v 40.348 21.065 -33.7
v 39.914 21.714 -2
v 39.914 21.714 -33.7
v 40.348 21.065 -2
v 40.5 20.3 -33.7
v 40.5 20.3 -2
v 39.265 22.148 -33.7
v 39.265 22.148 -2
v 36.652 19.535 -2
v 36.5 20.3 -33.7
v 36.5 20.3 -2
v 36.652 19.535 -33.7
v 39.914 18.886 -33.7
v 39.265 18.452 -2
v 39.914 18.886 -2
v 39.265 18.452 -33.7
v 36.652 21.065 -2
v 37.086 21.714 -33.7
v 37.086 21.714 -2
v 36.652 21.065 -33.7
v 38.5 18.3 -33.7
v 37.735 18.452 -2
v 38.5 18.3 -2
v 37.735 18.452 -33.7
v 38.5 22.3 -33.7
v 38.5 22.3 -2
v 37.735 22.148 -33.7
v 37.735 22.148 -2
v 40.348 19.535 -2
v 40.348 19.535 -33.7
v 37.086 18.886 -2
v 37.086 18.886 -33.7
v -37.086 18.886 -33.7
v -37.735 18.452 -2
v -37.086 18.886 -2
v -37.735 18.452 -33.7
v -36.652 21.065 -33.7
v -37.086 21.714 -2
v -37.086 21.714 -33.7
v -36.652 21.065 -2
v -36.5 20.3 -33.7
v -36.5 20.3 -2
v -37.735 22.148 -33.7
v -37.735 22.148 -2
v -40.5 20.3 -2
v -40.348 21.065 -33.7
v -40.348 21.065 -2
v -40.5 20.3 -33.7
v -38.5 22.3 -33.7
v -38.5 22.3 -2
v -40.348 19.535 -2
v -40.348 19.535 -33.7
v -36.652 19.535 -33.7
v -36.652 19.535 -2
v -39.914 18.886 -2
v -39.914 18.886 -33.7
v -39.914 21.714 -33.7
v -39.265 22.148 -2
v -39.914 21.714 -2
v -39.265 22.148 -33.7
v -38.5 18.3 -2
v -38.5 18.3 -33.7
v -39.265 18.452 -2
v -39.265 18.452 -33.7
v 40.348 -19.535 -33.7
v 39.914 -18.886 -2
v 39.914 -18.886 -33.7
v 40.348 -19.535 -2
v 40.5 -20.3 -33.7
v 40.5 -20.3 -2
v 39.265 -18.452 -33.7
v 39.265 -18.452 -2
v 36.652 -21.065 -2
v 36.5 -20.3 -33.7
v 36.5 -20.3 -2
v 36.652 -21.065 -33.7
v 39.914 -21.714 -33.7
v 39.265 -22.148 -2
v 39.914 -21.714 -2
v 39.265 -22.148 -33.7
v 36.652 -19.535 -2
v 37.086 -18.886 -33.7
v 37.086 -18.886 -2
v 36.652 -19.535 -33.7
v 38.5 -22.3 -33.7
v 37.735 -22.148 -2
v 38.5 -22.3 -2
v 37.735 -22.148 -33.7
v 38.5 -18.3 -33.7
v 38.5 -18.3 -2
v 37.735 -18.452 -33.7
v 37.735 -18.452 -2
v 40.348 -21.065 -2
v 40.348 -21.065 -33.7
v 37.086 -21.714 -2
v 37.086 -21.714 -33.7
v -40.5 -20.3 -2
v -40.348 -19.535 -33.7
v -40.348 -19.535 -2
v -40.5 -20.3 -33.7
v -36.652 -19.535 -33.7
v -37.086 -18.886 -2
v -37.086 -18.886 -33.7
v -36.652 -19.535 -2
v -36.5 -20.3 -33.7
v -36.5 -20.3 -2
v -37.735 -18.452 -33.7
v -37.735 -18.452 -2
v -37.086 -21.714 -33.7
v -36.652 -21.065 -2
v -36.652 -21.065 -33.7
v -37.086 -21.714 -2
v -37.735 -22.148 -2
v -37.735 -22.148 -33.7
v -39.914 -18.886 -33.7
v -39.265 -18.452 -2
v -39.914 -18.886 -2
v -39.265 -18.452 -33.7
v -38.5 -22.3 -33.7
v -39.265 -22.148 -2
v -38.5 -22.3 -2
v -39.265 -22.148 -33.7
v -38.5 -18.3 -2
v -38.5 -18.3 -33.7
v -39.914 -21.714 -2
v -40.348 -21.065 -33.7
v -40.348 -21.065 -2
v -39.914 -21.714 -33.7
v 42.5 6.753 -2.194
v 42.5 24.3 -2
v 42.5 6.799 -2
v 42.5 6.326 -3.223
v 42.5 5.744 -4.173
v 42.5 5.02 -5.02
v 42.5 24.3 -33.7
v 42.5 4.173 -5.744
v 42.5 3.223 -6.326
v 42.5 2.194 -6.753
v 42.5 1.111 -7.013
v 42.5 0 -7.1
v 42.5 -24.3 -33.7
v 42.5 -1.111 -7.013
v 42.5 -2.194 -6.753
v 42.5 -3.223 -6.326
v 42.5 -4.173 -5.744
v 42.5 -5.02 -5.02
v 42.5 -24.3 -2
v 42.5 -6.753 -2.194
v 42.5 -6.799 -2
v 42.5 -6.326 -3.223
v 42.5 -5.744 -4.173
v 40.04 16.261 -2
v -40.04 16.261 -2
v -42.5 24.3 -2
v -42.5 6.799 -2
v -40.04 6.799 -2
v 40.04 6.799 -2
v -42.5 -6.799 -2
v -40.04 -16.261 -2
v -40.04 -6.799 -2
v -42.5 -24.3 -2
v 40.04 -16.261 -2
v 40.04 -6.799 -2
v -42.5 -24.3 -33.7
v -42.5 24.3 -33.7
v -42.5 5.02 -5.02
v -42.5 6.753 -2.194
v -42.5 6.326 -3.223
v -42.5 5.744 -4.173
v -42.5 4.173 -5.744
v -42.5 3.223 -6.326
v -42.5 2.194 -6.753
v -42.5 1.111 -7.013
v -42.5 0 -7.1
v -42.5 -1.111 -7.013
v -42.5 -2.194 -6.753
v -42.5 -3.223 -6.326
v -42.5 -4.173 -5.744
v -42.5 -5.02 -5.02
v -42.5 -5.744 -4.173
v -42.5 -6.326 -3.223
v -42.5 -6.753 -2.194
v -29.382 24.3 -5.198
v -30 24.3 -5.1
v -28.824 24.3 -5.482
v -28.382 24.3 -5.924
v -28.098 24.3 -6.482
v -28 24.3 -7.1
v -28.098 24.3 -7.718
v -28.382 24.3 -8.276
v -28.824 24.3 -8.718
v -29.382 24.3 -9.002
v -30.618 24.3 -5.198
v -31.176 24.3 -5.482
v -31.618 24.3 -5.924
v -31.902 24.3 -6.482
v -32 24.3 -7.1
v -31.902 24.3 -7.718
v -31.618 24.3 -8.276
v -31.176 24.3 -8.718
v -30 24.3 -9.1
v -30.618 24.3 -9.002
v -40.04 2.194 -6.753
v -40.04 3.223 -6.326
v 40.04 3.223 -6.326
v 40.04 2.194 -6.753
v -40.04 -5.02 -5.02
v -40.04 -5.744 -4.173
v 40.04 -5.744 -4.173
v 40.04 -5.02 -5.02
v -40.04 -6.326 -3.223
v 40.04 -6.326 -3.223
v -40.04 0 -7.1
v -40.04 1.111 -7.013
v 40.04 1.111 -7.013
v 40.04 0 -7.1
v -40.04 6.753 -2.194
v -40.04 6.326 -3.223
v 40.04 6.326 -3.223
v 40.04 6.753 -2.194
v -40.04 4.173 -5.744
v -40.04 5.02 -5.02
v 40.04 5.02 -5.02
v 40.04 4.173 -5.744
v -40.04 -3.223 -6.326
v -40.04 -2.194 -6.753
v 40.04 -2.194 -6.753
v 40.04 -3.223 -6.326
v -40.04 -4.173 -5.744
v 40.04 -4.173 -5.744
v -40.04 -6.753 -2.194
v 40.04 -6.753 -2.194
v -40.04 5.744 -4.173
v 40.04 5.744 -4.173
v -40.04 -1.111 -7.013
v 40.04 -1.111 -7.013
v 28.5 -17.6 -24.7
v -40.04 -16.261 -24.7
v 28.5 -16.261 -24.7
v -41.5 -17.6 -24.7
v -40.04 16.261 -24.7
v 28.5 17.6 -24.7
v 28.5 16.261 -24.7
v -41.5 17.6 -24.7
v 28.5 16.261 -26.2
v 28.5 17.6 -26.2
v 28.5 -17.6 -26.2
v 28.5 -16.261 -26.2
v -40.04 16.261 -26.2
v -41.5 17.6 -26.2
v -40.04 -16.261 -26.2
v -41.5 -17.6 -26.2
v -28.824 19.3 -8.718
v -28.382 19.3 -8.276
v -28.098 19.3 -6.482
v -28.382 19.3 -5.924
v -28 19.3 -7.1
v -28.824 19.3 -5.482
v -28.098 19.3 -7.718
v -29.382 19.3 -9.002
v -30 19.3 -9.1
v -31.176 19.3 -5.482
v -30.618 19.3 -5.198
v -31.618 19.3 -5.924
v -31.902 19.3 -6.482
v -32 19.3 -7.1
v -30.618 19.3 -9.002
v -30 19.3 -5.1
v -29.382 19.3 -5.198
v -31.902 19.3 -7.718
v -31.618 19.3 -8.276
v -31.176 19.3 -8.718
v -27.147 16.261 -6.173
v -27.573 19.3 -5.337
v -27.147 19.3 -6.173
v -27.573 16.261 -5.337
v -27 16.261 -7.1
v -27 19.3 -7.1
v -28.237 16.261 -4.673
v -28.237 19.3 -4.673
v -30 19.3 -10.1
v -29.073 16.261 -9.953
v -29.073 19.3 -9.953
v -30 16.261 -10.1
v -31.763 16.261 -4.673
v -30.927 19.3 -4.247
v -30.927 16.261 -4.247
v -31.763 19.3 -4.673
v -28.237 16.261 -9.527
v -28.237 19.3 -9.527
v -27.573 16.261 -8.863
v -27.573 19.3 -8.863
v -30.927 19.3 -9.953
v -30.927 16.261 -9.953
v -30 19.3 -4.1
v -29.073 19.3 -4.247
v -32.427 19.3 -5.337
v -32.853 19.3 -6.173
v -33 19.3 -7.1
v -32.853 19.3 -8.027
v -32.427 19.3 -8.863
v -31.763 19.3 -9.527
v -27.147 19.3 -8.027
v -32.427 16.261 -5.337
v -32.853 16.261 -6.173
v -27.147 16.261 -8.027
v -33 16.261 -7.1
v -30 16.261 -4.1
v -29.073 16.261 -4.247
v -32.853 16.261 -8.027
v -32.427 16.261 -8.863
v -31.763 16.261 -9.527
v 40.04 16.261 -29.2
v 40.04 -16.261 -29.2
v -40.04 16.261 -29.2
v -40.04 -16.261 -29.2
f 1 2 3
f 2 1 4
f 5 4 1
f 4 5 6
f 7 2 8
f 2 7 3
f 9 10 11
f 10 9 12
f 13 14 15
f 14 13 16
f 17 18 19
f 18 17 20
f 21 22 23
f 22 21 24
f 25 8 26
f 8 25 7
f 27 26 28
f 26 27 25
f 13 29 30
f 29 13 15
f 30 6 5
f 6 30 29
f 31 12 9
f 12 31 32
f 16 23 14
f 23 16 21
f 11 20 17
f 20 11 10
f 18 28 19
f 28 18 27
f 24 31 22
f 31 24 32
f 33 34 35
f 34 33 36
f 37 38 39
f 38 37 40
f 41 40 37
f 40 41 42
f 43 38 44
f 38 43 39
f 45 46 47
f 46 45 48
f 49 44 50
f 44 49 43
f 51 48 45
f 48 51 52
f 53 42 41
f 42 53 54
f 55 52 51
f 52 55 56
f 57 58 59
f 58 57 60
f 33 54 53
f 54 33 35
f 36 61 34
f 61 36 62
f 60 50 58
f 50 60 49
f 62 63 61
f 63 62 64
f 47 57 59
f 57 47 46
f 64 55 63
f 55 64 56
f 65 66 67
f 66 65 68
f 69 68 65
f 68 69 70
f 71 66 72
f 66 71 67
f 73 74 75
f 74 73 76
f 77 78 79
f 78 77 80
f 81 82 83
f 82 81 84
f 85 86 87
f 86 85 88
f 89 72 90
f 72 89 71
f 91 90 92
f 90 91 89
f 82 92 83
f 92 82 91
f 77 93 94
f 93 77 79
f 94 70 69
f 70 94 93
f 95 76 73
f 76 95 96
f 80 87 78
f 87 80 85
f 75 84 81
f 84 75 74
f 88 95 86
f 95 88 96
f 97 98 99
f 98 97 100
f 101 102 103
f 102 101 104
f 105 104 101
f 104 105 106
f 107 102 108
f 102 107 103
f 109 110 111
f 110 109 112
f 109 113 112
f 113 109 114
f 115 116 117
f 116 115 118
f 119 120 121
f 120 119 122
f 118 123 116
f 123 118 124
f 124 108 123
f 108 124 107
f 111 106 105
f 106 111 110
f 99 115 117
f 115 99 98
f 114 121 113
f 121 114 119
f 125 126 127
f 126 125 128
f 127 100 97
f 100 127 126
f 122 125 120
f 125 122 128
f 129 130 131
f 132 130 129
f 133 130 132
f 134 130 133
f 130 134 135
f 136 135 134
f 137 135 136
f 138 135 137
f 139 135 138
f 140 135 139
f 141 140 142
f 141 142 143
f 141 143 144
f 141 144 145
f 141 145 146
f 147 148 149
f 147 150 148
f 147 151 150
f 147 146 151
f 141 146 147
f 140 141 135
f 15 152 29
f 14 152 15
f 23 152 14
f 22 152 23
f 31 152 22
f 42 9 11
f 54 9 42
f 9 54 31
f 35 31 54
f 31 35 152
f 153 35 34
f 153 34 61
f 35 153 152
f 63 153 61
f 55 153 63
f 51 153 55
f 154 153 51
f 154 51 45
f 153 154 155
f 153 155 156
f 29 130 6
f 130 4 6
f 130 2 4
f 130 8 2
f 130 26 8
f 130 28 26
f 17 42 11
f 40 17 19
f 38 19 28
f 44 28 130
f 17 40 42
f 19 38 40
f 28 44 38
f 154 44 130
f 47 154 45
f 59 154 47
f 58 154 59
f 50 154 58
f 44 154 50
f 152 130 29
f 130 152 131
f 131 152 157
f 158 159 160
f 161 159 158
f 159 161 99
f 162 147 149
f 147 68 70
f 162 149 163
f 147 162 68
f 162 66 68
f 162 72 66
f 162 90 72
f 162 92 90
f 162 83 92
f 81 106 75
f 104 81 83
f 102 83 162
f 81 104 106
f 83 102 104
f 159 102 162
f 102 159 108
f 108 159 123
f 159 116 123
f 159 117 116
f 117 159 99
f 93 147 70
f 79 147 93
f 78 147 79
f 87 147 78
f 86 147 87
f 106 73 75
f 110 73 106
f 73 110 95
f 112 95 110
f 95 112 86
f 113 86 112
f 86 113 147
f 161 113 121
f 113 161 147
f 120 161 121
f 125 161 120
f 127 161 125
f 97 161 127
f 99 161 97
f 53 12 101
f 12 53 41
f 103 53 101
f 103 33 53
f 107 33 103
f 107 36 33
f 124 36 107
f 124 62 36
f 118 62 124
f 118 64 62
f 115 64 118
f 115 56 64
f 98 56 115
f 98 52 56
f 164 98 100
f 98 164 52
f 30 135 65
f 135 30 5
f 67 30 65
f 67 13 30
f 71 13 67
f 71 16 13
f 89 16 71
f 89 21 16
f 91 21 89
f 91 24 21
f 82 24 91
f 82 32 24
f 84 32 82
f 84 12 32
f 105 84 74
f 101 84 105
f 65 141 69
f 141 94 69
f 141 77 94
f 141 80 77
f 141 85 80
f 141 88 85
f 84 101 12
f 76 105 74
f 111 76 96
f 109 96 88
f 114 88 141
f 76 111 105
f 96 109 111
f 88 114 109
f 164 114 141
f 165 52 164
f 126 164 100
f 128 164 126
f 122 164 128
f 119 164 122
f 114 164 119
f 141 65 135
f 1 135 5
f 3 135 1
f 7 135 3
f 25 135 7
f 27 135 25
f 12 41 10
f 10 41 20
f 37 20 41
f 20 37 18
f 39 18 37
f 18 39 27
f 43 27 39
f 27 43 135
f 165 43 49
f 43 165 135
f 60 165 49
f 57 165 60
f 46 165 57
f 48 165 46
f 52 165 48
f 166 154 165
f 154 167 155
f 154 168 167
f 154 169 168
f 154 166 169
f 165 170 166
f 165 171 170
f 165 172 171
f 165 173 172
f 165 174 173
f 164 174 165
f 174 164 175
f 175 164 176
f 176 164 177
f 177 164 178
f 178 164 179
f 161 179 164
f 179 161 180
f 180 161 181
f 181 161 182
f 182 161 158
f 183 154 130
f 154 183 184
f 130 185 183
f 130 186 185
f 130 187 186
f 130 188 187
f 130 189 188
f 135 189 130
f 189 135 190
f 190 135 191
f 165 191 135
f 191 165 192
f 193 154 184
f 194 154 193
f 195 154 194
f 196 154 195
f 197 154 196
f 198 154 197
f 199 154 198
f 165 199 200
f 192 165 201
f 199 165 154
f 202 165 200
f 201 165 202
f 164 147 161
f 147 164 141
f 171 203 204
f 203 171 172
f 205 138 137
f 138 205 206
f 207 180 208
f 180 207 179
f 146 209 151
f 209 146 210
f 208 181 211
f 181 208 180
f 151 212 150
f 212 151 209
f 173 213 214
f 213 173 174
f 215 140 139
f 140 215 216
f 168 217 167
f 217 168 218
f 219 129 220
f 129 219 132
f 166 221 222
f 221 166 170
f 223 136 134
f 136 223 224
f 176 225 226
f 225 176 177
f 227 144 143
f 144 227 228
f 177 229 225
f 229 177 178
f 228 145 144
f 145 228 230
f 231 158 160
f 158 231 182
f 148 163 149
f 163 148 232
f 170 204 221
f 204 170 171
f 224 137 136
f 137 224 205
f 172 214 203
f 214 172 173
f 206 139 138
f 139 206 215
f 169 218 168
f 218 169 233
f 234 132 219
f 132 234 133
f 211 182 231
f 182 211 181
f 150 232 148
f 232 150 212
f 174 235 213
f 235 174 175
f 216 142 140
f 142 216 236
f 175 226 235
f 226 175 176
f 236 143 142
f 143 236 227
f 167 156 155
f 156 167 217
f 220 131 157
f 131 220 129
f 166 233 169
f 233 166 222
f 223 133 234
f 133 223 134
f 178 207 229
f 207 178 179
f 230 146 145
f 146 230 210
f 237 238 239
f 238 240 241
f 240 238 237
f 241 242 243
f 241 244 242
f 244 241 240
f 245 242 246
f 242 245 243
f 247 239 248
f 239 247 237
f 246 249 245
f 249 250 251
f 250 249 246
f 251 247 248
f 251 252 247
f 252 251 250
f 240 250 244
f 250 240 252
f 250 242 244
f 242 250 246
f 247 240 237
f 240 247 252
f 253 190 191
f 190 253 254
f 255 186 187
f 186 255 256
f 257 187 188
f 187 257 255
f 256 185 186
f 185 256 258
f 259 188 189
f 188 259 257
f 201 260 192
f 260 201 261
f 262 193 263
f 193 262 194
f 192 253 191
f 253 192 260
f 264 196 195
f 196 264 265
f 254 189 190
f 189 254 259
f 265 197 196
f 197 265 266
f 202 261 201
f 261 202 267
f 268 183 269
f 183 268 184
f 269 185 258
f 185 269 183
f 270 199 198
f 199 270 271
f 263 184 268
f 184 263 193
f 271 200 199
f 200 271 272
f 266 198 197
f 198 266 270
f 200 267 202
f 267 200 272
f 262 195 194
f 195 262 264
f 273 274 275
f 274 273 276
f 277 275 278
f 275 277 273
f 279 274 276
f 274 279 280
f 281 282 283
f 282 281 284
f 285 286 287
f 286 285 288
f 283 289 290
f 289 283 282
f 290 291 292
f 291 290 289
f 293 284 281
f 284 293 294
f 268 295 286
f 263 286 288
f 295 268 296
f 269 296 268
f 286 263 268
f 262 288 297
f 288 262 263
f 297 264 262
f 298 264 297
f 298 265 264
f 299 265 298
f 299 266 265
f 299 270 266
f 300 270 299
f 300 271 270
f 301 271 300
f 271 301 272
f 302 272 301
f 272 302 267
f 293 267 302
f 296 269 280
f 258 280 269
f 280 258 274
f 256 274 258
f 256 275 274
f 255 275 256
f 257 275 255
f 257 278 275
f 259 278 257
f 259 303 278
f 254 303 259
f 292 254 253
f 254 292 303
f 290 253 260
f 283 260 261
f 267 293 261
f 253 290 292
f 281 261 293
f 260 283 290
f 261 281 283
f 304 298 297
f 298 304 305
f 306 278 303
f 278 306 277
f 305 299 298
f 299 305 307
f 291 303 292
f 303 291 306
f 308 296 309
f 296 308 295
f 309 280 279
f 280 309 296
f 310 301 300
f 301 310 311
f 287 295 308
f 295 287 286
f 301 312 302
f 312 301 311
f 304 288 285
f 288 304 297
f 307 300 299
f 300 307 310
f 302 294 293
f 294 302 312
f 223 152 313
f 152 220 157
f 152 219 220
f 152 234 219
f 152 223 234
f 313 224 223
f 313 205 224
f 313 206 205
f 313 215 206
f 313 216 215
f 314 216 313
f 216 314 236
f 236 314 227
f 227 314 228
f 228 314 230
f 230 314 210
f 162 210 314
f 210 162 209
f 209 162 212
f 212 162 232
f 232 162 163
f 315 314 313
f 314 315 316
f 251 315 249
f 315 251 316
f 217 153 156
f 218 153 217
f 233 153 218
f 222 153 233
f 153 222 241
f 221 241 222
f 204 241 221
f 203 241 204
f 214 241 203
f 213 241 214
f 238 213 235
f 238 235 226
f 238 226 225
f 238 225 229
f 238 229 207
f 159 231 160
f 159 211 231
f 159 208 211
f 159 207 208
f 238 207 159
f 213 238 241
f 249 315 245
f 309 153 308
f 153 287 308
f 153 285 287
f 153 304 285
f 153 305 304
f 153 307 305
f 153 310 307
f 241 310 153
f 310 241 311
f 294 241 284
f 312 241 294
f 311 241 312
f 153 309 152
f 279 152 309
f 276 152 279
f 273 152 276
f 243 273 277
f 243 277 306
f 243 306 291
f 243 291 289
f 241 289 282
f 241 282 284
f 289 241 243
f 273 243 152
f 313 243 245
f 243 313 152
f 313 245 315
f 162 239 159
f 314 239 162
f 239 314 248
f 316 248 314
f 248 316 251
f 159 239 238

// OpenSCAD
// file: bolt.scad
include <variables.scad>

bolt();

module bolt() {
	color("Silver")
	union() {
		for (i = [0:2]) {
			rotate([0, 0, 180/3*i])
			cube([boltWidth, boltSegmentWidth, boltHeight],center=true);
		}
	}
}
// file: box.scad
include <variables.scad>
use <bolt.scad>

CylinderPunchedBox(MaxLength, MinWidth, stickRadius-boxSpacing/2+batteryRadius*2+minEdgeWidth, holeRadius, holeRadius*2, true);

module HoledBox(length, width, height, holeRadius, holePadding, NutIndents) {
	difference() {
		cube([length, width, height], center = true);
		
		scale([1,1,1.001])
		union() { // subtractions
			// holes
			translate([
				 (length-holePadding-holeRadius*2)/2, 
				 (width-holePadding-holeRadius*2)/2, 
				-(height)/2])
			cylinder(height+.1, r=holeRadius, $fn=16);
			translate([
				-(length-holePadding-holeRadius*2)/2, 
				 (width-holePadding-holeRadius*2)/2, 
				-(height)/2])
			cylinder(height+.1, r=holeRadius, $fn=16);
			translate([
				 (length-holePadding-holeRadius*2)/2, 
				-(width-holePadding-holeRadius*2)/2, 
				-(height)/2])
			cylinder(height+.1, r=holeRadius, $fn=16);
			translate([
				-(length-holePadding-holeRadius*2)/2, 
				-(width-holePadding-holeRadius*2)/2, 
				-(height)/2])
			cylinder(height+.1, r=holeRadius, $fn=16);
		}

		if(NutIndents) {
			translate([0, 0, -(height-boltHeight+0.001)/2]) {
				translate([(length-holePadding-holeRadius*2)/2, (width-holePadding-holeRadius*2)/2, ])
				scale([1.05, 1.05, 1.1])
				bolt();
				translate([(length-holePadding-holeRadius*2)/2, -(width-holePadding-holeRadius*2)/2, ])
				scale([1.05, 1.05, 1.1])
				bolt();
				translate([-(length-holePadding-holeRadius*2)/2, (width-holePadding-holeRadius*2)/2, ])
				scale([1.05, 1.05, 1.1])
				bolt();
				translate([-(length-holePadding-holeRadius*2)/2, -(width-holePadding-holeRadius*2)/2, ])
				scale([1.05, 1.05, 1.1])
				bolt();
			}
		}
	}
}

module CylinderPunchedBox(length, width, height, holeRadius, holePadding, NutIndents) {
	difference() {
		translate([0, 0, -(height+boxSpacing)/2])
		HoledBox(length, width, height, holeRadius, holePadding, NutIndents);

		scale([1.001, 1, 1])
		rotate([0, 90, 0])
		cylinder((length), r=stickRadius, center=true, $fn=40);
	}
}
// file: pcb.scad
include <variables.scad>

PCB();

module PCB() {
	pinheaderHeight = PCBBoardToBoardHeight-2*PCBHeight;
	pinheaderLength = 38;
	pinheaderWidth = 2.4;
  color(alpha=0.5)
	translate([-(PCBLength-PCBBoardLength), 0, -(PCBBoardToBoardHeight)]) {
		color("Orange")
		translate([(PCBLength-PCBBoardLength)/2, 0, PCBHeight/2])
		cube([PCBBoardLength, PCBWidth, PCBHeight], center=true);
		
		translate([0, 0, PCBHeight]) {
			color("Grey") {
				translate([0, (PCBWidth-pinheaderWidth)/2-PCBNotchWidth, pinheaderHeight/2])
				cube([pinheaderLength, pinheaderWidth, pinheaderHeight], center=true);
				translate([0, -(PCBWidth-pinheaderWidth)/2+PCBNotchWidth, pinheaderHeight/2])
				cube([pinheaderLength, pinheaderWidth, pinheaderHeight], center=true);
			}
			color("Black")
			translate([0, 0, pinheaderHeight+PCBHeight/2])
			cube([55, 32.5, PCBHeight], center=true);

			color("Blue")
			translate([-PCBSensorBoardOverhang, PCBSensorBoardYOffset, 0])
			translate([PCBLength/2, 0, 0])
			translate([PCBSensorBoardLength/2, 0, pinheaderHeight+PCBHeight/2])
			difference() {
				cube([PCBSensorBoardLength, PCBSensorBoardWidth, PCBHeight], center=true);
				translate([PCBSensorBoardLength/2-1-PCBSensorBoardHoleRadius,  (PCBSensorBoardHoleCenterYDistance/2), 0])
				cylinder(10, r=PCBSensorBoardHoleRadius, center=true, $fn=20);
				translate([PCBSensorBoardLength/2-1-PCBSensorBoardHoleRadius, -(PCBSensorBoardHoleCenterYDistance/2), 0])
				cylinder(10, r=PCBSensorBoardHoleRadius, center=true, $fn=20);
			}
			
			color("Grey")
			translate([34, 0, pinheaderHeight/2])
			cube([pinheaderWidth, 20, pinheaderHeight], center=true);
		}
	}
}
// file: variables.scad
innerWidth = 38;
innerLength = 80;
innerHeight = 25;
minEdgeWidth = 2.5;
largeEdgeWidth = 6;
holeRadius = 2;
boxSpacing = 4;
stickRadius = 7.1; // fixed by table

sensorScrewHoleRadius = 2.5/2;

// PCBVariables
	PCBWidth = 35.2;
	PCBBoardLength = 70;
	PCBLength = 80;// 70;
	PCBHeight = 1.5;
	PCBBoardToBoardHeight = 13.9; // height of the two layers of pcb and the pinheaders between them
	
	PCBToBottomSpacing = 3; // space for wires on bottom of PCB
	PCBToTopSpacing = 2; // Air gap between pcb components and stick
	PCBNotchWidth = 1.5; // user definable
	PCBComponentsHeight = 17.1-PCBBoardToBoardHeight; // Height of pCB components on top of top layer pcb

	PCBSensorBoardLength = 15.75;
	PCBSensorBoardWidth = 21;
	PCBSensorBoardOverhang = 7.4; // The length of sensor board that overhangs the main print board
	PCBSensorBoardYOffset = -1.5/2;
	PCBSensorBoardHoleRadius = 1.5;
	PCBSensorBoardHoleCenterYDistance = 12.3+PCBSensorBoardHoleRadius*2;

// BatteryBoxVariables
	batteryRadius = 18.3/2;
	batteryLenght = 65;

// Bolts
	boltHeight = 2.4;
	boltWidth = 5.4;
	boltSegmentWidth = 3.2;

// Switch
	SwitchBaseLength = 9.8;
	SwitchBaseWidth = 13.1;
	SwitchBaseHeight = 8;

	SwitchCylinderRadius = 6/2;
	SwitchCylinderLength = 9;
	SwitchLegLength = 4;

// switch_alt
	SwitchAltWidth = 13;
	SwitchAltHeight = 6;
	SwitchAltDepth = 6;
	SwitchPinLength = 4;
	SwitchAltFlipperHeight = 7;


MaxLength = 85; // fixed by table
MinWidth = max(batteryRadius*4, PCBWidth)+2*largeEdgeWidth;
MinHeight = max(batteryRadius*2, PCBToTopSpacing+PCBComponentsHeight+PCBBoardToBoardHeight+PCBToBottomSpacing)+stickRadius+minEdgeWidth;
// main file
include <variables.scad>
use <pcb.scad>
use <box.scad>

pcbBox();

module pcbBox() {
	difference() {
		CylinderPunchedBox(MaxLength, MinWidth, MinHeight, holeRadius, holeRadius*2);
		
		// Hollow out inside box space
		CutoutHeight = stickRadius+(PCBBoardToBoardHeight+PCBComponentsHeight)+PCBToBottomSpacing+PCBToTopSpacing;
		scale([1.001, 1.01, 1])
		translate([0, 0, -(CutoutHeight)/2])
		cube([PCBLength, PCBWidth-PCBNotchWidth*2, CutoutHeight], center=true);
		
		// PCB Notches cutout
		translate([-PCBNotchWidth, 0, -(stickRadius+PCBToTopSpacing+PCBComponentsHeight)])
		PCB();		

		// LED hole
		ledSmallRadius = 2;
		ledLargeRadius = 3;
		ledSmallHoleLength = 5;
		ledLargeHoleLength = ((MinWidth-(PCBWidth-PCBNotchWidth*2))/2)-ledSmallHoleLength;
		color("Green")
		translate([-PCBBoardLength/2+5, MinWidth/2, -(stickRadius)])
		rotate([90, 0, 0]){
			scale([1, 1, 1.01])
			translate([0, 0, -0.01])
			cylinder(ledSmallHoleLength, r=ledSmallRadius, center=false, $fn=20);
			translate([0, 0, ledSmallHoleLength])
			cylinder(ledLargeHoleLength, r=ledLargeRadius, center=false, $fn=20);
		}
	}
}
